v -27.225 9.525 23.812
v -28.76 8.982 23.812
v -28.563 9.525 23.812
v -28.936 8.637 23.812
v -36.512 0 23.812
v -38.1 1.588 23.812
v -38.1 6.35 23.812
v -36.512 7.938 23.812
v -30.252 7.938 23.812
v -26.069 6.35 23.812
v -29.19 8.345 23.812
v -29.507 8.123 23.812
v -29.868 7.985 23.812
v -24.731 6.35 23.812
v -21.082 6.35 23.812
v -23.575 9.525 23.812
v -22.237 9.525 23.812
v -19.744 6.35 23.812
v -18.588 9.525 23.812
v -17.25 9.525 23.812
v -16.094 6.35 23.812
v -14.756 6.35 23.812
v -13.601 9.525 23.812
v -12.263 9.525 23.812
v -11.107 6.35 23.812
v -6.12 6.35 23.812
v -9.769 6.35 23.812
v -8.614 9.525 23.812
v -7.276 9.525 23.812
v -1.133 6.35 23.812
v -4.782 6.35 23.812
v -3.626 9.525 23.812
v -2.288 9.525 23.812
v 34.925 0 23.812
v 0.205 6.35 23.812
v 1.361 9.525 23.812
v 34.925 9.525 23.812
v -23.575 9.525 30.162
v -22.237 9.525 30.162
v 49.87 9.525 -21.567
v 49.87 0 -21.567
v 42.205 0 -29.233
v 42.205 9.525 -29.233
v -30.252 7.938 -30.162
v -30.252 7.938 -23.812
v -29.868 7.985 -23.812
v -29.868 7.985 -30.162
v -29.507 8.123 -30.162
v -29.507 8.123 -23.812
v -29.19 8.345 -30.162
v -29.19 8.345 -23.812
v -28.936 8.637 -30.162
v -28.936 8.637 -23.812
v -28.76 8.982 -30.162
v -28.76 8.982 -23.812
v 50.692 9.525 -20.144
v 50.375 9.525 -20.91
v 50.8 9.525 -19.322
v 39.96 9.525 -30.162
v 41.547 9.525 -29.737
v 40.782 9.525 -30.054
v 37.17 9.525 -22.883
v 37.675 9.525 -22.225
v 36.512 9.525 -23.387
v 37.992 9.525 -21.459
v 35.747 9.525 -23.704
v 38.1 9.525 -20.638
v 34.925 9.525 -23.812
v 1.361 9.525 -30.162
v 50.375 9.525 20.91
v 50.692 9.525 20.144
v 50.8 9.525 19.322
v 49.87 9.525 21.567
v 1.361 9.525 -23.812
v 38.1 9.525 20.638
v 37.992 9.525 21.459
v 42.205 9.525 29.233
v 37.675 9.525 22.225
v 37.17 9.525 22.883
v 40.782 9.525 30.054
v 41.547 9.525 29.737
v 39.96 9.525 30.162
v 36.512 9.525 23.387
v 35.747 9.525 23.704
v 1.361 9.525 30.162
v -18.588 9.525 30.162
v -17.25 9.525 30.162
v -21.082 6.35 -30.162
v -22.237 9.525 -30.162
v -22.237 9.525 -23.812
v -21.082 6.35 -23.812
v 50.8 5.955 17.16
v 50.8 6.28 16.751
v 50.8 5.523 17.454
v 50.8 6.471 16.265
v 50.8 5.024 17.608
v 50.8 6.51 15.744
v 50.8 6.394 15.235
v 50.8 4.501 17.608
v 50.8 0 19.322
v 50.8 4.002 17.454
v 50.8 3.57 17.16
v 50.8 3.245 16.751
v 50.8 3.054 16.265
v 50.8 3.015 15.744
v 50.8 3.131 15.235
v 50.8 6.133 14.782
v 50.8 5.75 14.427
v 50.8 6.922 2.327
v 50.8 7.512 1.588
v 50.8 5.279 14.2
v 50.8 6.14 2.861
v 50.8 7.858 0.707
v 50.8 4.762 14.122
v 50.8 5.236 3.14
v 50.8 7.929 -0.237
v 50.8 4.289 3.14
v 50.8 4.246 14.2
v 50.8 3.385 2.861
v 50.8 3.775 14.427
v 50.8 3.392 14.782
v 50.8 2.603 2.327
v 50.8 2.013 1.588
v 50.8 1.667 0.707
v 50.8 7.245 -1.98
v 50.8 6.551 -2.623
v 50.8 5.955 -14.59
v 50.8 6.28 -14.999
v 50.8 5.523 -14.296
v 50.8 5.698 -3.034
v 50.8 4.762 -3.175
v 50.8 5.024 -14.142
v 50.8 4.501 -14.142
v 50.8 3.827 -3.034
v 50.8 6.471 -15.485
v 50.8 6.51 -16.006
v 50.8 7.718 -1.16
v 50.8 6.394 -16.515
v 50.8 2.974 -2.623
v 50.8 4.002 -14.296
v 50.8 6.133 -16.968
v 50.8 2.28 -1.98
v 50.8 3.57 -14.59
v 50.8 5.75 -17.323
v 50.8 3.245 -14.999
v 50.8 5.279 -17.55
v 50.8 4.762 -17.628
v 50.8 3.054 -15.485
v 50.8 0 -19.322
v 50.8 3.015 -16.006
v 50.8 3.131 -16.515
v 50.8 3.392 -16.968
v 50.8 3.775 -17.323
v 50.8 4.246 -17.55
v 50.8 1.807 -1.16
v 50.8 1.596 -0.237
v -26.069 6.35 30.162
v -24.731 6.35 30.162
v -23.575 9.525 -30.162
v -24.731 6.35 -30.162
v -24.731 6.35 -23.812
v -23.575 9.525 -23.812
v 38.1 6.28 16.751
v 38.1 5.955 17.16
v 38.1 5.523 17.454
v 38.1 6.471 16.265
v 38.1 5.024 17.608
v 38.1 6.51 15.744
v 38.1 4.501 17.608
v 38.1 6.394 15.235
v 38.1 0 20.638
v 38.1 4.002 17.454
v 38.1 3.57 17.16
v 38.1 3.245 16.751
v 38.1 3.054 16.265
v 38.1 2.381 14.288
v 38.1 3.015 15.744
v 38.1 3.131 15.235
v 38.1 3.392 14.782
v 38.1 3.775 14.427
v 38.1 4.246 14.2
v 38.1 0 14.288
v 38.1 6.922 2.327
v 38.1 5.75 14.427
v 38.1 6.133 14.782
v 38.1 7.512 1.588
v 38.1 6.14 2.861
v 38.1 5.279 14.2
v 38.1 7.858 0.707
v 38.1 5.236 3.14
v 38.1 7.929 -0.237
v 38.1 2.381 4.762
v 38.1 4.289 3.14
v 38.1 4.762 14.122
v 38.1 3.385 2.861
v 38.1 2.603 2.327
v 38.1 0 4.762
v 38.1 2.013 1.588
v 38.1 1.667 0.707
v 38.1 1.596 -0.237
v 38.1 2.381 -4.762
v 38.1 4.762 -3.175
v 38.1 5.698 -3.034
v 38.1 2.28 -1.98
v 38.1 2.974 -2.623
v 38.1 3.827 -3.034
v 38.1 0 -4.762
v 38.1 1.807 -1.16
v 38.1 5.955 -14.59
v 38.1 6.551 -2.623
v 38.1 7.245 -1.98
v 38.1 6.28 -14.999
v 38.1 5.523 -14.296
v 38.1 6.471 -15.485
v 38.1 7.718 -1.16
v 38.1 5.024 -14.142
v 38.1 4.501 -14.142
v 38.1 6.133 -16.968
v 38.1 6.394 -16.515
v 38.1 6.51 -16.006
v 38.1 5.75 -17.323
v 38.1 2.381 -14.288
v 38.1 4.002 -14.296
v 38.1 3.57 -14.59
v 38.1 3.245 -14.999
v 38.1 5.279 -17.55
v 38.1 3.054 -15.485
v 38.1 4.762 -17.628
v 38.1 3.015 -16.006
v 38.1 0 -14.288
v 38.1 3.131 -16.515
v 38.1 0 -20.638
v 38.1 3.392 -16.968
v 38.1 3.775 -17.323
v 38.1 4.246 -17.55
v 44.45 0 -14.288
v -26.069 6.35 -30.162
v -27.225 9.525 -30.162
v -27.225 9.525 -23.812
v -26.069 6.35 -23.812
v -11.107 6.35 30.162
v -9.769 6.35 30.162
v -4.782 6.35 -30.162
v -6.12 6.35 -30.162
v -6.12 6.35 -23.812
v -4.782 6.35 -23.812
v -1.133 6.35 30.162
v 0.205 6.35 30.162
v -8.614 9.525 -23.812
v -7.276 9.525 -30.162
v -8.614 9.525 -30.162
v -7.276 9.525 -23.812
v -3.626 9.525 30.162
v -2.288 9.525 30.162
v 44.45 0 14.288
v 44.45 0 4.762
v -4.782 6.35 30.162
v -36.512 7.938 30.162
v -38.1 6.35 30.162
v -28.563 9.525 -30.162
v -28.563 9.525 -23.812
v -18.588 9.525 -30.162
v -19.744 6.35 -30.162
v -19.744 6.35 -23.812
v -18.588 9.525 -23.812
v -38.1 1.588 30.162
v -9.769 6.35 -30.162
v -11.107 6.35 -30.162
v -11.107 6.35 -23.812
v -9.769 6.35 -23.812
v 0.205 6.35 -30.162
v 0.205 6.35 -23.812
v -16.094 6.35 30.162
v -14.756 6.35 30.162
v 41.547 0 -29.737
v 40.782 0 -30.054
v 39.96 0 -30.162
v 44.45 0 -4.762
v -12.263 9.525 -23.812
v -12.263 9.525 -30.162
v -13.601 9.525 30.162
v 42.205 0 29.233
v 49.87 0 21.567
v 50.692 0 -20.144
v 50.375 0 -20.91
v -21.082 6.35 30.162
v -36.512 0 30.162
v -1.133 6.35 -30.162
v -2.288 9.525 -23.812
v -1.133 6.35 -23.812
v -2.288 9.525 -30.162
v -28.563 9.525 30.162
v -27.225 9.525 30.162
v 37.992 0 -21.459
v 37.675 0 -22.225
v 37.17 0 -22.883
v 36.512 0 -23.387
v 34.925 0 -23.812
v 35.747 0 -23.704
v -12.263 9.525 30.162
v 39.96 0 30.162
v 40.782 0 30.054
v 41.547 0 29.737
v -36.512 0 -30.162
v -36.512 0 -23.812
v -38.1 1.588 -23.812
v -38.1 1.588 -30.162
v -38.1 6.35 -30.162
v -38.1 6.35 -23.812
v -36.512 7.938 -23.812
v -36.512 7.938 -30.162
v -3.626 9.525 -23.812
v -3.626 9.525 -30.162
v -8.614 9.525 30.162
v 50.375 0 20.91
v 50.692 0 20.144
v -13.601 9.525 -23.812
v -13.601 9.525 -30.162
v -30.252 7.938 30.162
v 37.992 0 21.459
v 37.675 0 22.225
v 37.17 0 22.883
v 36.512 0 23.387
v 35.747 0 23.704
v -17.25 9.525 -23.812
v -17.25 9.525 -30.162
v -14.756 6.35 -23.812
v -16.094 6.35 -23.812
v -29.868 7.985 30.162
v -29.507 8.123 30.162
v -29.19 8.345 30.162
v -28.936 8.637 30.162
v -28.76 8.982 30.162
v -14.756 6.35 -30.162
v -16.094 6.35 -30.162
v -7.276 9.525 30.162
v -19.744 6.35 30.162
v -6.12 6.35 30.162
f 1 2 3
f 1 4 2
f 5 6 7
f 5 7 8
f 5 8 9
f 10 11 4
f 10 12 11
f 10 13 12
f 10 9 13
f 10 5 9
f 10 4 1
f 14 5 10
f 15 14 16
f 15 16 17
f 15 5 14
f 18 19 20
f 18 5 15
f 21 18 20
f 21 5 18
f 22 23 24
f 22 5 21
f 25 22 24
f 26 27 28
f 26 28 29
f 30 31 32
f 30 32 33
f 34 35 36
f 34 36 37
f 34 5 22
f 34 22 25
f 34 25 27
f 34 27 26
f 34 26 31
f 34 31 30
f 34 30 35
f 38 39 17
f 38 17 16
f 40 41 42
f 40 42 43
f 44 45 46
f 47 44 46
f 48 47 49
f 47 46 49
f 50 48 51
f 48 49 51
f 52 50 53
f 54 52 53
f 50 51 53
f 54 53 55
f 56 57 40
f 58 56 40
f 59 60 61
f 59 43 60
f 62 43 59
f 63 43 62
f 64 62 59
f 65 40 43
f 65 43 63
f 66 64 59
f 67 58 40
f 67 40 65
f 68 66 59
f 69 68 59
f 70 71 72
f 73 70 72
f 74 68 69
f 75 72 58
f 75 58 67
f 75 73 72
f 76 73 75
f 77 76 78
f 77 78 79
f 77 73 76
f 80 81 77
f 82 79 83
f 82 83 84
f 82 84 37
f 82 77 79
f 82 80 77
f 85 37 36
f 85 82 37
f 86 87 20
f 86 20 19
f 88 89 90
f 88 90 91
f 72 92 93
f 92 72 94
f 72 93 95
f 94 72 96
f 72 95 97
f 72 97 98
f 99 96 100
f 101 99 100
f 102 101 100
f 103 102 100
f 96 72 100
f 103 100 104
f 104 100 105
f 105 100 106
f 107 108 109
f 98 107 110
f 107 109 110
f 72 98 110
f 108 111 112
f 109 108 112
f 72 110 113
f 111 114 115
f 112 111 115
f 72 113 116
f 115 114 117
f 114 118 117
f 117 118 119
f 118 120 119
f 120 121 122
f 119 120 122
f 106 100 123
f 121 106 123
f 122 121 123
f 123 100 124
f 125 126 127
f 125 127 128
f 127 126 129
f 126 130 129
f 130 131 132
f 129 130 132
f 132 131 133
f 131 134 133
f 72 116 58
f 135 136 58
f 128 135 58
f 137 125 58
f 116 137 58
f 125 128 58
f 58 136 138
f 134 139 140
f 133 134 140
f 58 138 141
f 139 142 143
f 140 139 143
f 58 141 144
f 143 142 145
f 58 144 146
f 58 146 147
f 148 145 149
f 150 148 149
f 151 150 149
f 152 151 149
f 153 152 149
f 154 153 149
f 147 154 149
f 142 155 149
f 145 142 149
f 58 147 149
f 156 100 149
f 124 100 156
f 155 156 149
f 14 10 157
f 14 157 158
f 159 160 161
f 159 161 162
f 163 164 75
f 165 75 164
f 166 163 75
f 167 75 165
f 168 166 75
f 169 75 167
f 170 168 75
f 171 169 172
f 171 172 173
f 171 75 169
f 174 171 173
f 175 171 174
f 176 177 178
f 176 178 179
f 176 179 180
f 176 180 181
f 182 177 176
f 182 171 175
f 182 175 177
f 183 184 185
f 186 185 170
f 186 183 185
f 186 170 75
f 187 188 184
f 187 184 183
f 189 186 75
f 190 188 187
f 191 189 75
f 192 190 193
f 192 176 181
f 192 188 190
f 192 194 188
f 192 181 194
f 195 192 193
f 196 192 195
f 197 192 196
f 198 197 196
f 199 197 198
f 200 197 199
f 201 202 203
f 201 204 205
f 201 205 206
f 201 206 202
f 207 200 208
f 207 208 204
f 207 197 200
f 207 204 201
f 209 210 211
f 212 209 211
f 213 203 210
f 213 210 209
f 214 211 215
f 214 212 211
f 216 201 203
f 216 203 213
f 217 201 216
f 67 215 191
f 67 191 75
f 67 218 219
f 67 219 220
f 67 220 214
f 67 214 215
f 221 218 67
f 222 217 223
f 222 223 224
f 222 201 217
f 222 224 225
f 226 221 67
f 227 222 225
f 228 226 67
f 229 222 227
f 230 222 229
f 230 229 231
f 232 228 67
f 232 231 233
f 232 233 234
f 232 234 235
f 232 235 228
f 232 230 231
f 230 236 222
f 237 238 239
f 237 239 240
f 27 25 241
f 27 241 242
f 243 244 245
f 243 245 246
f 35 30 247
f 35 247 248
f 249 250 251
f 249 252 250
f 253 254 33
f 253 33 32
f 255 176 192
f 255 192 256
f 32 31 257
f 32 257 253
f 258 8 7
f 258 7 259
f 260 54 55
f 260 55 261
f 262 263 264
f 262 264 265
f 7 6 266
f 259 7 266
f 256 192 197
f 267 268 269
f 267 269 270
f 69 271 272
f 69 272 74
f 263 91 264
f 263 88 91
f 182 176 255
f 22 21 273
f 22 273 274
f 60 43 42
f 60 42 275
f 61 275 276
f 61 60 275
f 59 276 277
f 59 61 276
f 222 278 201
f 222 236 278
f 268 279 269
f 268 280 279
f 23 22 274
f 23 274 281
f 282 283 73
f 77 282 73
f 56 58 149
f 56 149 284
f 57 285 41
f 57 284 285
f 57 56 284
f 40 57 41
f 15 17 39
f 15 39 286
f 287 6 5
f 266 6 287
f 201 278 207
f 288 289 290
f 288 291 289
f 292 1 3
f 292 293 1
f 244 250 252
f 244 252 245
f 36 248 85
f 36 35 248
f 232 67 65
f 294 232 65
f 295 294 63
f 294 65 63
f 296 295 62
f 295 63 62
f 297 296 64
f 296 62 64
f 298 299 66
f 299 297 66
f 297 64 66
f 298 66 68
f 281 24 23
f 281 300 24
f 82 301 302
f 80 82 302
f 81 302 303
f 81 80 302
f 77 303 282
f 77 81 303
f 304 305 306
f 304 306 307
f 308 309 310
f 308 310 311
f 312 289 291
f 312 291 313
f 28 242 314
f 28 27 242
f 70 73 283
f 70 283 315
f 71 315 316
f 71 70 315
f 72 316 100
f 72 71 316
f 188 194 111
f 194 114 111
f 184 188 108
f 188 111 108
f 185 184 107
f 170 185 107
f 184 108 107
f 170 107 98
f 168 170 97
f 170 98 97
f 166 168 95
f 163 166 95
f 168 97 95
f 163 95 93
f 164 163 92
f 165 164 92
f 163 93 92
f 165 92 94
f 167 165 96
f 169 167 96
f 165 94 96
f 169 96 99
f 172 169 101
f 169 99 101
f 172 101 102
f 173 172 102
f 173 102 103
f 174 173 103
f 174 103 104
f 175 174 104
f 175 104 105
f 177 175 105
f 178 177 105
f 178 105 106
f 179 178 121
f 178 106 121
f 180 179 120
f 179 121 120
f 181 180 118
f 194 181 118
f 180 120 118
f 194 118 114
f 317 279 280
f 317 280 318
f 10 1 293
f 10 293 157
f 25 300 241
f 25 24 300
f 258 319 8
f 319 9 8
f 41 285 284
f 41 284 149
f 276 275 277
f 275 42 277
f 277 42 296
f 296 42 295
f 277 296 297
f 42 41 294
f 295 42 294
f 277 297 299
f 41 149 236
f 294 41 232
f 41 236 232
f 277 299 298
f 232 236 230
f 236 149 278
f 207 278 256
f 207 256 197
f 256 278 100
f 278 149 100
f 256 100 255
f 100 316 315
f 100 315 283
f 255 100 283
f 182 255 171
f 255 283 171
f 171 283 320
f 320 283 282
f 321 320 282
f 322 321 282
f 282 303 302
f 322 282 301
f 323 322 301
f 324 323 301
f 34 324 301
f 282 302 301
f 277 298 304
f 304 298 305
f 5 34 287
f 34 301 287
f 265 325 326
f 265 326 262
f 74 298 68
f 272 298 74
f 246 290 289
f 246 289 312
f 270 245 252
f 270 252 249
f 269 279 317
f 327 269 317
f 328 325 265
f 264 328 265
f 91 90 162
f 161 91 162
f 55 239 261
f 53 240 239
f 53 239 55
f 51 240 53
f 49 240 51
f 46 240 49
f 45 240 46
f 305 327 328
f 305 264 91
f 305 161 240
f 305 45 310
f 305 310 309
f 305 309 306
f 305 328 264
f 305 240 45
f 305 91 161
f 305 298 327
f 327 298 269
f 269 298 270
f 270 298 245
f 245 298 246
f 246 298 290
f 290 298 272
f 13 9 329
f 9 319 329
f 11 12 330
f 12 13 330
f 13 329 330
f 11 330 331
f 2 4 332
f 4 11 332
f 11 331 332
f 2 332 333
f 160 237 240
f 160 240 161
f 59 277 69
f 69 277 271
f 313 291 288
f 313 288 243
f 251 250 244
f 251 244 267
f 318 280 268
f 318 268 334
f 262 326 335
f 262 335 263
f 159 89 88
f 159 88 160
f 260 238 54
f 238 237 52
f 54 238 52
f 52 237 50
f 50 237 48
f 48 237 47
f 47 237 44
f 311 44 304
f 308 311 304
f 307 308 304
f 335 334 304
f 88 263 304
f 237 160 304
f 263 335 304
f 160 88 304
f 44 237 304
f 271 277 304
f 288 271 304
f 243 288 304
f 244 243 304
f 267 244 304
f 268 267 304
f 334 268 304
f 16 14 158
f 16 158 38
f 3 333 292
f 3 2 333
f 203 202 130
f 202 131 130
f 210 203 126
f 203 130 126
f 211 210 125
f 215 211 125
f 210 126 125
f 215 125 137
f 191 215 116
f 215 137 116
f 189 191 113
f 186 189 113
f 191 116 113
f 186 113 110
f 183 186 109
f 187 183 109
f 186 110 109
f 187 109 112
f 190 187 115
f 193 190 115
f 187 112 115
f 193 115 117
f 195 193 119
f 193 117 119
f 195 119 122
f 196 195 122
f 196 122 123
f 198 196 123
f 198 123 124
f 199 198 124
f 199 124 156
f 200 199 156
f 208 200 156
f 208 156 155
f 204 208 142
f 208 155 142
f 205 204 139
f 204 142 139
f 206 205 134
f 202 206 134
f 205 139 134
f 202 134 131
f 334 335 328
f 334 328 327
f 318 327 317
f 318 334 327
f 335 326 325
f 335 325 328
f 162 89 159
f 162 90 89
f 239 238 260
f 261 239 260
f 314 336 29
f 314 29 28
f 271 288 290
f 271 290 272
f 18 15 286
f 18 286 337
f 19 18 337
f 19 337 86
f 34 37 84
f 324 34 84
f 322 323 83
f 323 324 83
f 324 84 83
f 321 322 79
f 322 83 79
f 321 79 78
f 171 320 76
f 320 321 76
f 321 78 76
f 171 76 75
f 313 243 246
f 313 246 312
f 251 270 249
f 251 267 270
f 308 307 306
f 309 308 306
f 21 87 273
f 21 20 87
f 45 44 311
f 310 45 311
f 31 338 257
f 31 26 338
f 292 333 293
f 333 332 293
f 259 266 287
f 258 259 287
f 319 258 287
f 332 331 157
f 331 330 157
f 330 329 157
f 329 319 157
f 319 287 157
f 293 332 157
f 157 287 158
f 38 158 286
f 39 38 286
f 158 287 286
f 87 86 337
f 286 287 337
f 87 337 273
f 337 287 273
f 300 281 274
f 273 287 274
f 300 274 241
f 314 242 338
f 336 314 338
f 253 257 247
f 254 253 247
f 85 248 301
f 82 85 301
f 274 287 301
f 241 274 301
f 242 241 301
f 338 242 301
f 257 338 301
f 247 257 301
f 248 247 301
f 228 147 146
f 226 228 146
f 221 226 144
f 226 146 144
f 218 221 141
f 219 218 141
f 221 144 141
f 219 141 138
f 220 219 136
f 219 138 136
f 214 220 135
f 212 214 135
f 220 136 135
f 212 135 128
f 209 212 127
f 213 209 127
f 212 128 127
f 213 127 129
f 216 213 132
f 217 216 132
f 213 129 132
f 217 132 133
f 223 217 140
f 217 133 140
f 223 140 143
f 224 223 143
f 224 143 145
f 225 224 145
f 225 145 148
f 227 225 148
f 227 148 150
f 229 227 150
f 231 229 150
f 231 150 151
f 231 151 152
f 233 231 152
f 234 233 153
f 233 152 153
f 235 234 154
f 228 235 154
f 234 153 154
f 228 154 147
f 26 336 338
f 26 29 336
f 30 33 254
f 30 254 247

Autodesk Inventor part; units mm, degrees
ref_plane "YZ Plane" through (0, 0, 0) normal (1, 0, 0) x (0, 1, 0)
ref_plane "XZ Plane" through (0, 0, 0) normal (0, 1, 0) x (-1, 0, 0)
sketch "Sketch1" plane through (0, 0, 0) normal (0, 1, 0) x (-1, 0, 0)
  line L0 (38.1, 23.8125) -> (-38.1, 23.8125)
  line L1 (-38.1, 23.8125) -> (-38.1, -23.8125)
  line L2 (-38.1, -23.8125) -> (38.1, -23.8125)
  line L3 (38.1, -23.8125) -> (38.1, 23.8125)
  line L4 (38.1, 23.8125) -> (-38.1, -23.8125) construction
  line L5 (-38.1, 23.8125) -> (38.1, -23.8125) construction
  line L6 (0, 0) -> (-38.1, 0) construction
  line L7 (38.1, 30.1625) -> (-50.8, 30.1625)
  line L8 (-50.8, 30.1625) -> (-50.8, -30.1625)
  line L9 (-50.8, -30.1625) -> (38.1, -30.1625)
  line L10 (38.1, -30.1625) -> (38.1, 30.1625)
  line L11 (38.1, 30.1625) -> (-50.8, -30.1625) construction
  line L12 (-50.8, 30.1625) -> (38.1, -30.1625) construction
  point P0 (-6.35, 0)
  point P1 (38.1, 23.8125)
  dimension "d0" = 76.2
  dimension "d1" = 47.625
  dimension "d2" = 6.35
  dimension "d3" = 12.7
extrude "Extrusion1" add sketch "Sketch1" along normal blind 9.525 contours L0 L1 L2 L10 L9 L8 L7
chamfer "Chamfer1" distance 9.525 angle 45 2 edges at (50.8, 4.7625, 30.1625) (50.8, 4.7625, -30.1625)
fillet "Fillet1" radius 3.175 4 edges at (41.275, 4.7625, -30.1625) (50.8, 4.7625, -20.6375) (50.8, 4.7625, 20.6375) (41.275, 4.7625, 30.1625)
fillet "Fillet4" radius 3.175 2 edges at (38.1, 4.7625, -23.8125) (38.1, 4.7625, 23.8125)
sketch "Sketch2" plane through (50.8, 0, 19.3224) normal (1, 0, 0) x (0, 0, -1)
  line L0 (43.1349, 9.525) -> (-4.4901, 9.525) projected
  line L1 (43.1349, 0) -> (-4.4901, 0) projected
  circle A0 centre (19.3224, 4.7625) radius 3.175
  line L2 (0, 9.525) -> (38.6447, 9.525) projected
  line L3 (19.3224, 9.525) -> (19.3224, 0) construction
  line L4 (19.3224, 4.7625) -> (3.4474, 4.7625) construction
  circle A1 centre (3.4474, 4.7625) radius 1.7526
  circle A2 centre (35.1974, 4.7625) radius 1.7526
  point P0 (38.6447, 9.525)
  point P1 (6.35, 9.525)
  point P2 (38.6447, 0)
  point P3 (6.35, 0)
  dimension "d10" = 6.35
  dimension "d99" = 15.875
  dimension "d100" = 3.5052
  dimension "d103" = 360
extrude "Extrusion6" cut sketch "Sketch2" against normal through all
sketch "Sketch5" plane through (-38.1, 0, -30.1625) normal (0, 0, -1) x (-1, 0, 0)
  line L0 (0, 0) -> (0, 9.525) projected
  line L1 (0, 9.525) -> (-78.0599, 9.525) projected
  line L2 (-10.8754, 9.525) -> (-12.031, 6.35)
  line L3 (-12.031, 6.35) -> (-13.369, 6.35)
  line L4 (-13.369, 6.35) -> (-14.5246, 9.525)
  line L5 (-25.4, 9.525) -> (-25.4, 6.35) construction
  line L6 (0, 9.525) -> (0, 6.35) construction
  line L7 (-12.7, 9.525) -> (-12.7, 6.35) construction
  line L8 (-25.4, 7.9375) -> (0, 7.9375) construction
  line L9 (-15.8627, 9.525) -> (-17.0183, 6.35)
  line L10 (-17.0183, 6.35) -> (-18.3563, 6.35)
  line L11 (-18.3563, 6.35) -> (-19.5119, 9.525)
  line L12 (-17.6873, 9.525) -> (-17.6873, 6.35) construction
  line L13 (-20.8499, 9.525) -> (-22.0055, 6.35)
  line L14 (-22.0055, 6.35) -> (-23.3436, 6.35)
  line L15 (-23.3436, 6.35) -> (-24.4992, 9.525)
  line L16 (-22.6746, 9.525) -> (-22.6746, 6.35) construction
  line L17 (-25.8372, 9.525) -> (-26.9928, 6.35)
  line L18 (-26.9928, 6.35) -> (-28.3309, 6.35)
  line L19 (-28.3309, 6.35) -> (-29.4865, 9.525)
  line L20 (-27.6618, 9.525) -> (-27.6618, 6.35) construction
  line L21 (-30.8245, 9.525) -> (-31.9801, 6.35)
  line L22 (-31.9801, 6.35) -> (-33.3181, 6.35)
  line L23 (-33.3181, 6.35) -> (-34.4737, 9.525)
  line L24 (-32.6491, 9.525) -> (-32.6491, 6.35) construction
  line L25 (-35.8118, 9.525) -> (-36.9674, 6.35)
  line L26 (-36.9674, 6.35) -> (-38.3054, 6.35)
  line L27 (-38.3054, 6.35) -> (-39.461, 9.525)
  line L28 (-37.6364, 9.525) -> (-37.6364, 6.35) construction
  line L29 (-12.031, 6.35) -> (0, 6.35)
  line L30 (-5.8881, 9.525) -> (-7.0437, 6.35)
  line L31 (-8.3817, 6.35) -> (-9.5373, 9.525)
  line L32 (-8.9595, 7.9375) -> (0, 7.9375)
  point P0 (-38.1, 0)
  point P1 (-13.9468, 7.9375)
  point P2 (-11.4532, 7.9375)
  point P3 (-11.4532, 7.9375)
  point P4 (-16.4405, 7.9375)
  point P5 (-16.4405, 7.9375)
  point P6 (-4.9873, 6.35)
  point P7 (-30.3873, 6.35)
  point P8 (-18.9341, 7.9375)
  point P9 (-21.4277, 7.9375)
  point P10 (-21.4277, 7.9375)
  point P11 (-9.9746, 6.35)
  point P12 (-35.3746, 6.35)
  point P13 (-23.9214, 7.9375)
  point P14 (-26.415, 7.9375)
  point P15 (-26.415, 7.9375)
  point P16 (-14.9618, 6.35)
  point P17 (-40.3618, 6.35)
  point P18 (-28.9087, 7.9375)
  point P19 (-31.4023, 7.9375)
  point P20 (-31.4023, 7.9375)
  point P21 (-19.9491, 6.35)
  point P22 (-45.3491, 6.35)
  point P23 (-33.8959, 7.9375)
  point P24 (-36.3896, 7.9375)
  point P25 (-36.3896, 7.9375)
  point P26 (-24.9364, 6.35)
  point P27 (-50.3364, 6.35)
  point P28 (-38.8832, 7.9375)
  point P29 (-15.8627, 9.525)
  point P30 (-35.8118, 9.525)
  point P31 (-30.8245, 9.525)
  point P32 (-25.8372, 9.525)
  point P33 (-29.4865, 9.525)
  point P34 (-20.8499, 9.525)
  point P35 (-24.4992, 9.525)
  point P36 (-6.4659, 7.9375)
  point P37 (-6.4659, 7.9375)
  point P38 (0, 7.9375)
  point P39 (-9.5373, 9.525)
  dimension "d68" = 3.175
  dimension "d70" = 70
  dimension "d71" = 2.4936
  dimension "d74" = 4.9873
  dimension "d79" = 12.7
  dimension "d82" = 4.9873
extrude "Extrusion8" cut sketch "Sketch5" against normal through all contours L25 L26 L27 L1 | L21 L22 L23 L1 | L17 L18 L19 L1 | L13 L14 L15 L1 | L9 L10 L11 L1 | L32 L30 L1 L0 | L32 L31 L1 L30 | L3 L4 L1 L2
fillet "Fillet5" radius 1.5875 2 edges at (-29.1405, 7.9375, -26.9875) (-29.1405, 7.9375, 26.9875)
chamfer "Chamfer3" distance 1.5875 angle 45 2 edges at (-38.1, 7.9375, -26.9875) (-38.1, 7.9375, 26.9875)
chamfer "Chamfer4" distance 1.5875 angle 45 2 edges at (-38.1, 0, -26.9875) (-38.1, 0, 26.9875)
ref_plane "Work Plane1" through (39.9599, 0, 14.2875) normal (0, 0, 1) x (1, 0, 0)
sketch "Sketch7" plane through (39.9599, 0, 14.2875) normal (0, 0, 1) x (1, 0, 0)
  line L0 (0, 0) -> (-76.4724, 0) projected
  line L1 (-1.8599, 9.525) -> (-1.8599, 0) projected
  line L2 (-1.8599, 0) -> (4.4901, 0)
  line L3 (4.4901, 0) -> (4.4901, 2.3813) construction
  line L4 (4.4901, 2.3813) -> (-1.8599, 2.3812) construction
  line L5 (-1.8599, 2.3812) -> (-1.8599, 0)
  line L6 (-1.8599, 2.3812) -> (4.4901, 0)
  point P0 (-39.9599, 0)
  point P1 (-1.8599, 2.3812)
  dimension "d114" = 6.35
  dimension "d115" = 2.3813
extrude "Extrusion10" cut sketch "Sketch7" against normal blind 9.525
mirror "Mirror2" about plane through (0, 0, 0) normal (0, 0, 1) of "Extrusion10"
equation "\"d71\" = 0.5 * d69"
equation "\"d74\" = 1.5708 * d68"
equation "\"d82\" = d74"
equation "\"d69\" = 1.5708 * d68"
properties part number "Rack" material "Aluminum 6061"
